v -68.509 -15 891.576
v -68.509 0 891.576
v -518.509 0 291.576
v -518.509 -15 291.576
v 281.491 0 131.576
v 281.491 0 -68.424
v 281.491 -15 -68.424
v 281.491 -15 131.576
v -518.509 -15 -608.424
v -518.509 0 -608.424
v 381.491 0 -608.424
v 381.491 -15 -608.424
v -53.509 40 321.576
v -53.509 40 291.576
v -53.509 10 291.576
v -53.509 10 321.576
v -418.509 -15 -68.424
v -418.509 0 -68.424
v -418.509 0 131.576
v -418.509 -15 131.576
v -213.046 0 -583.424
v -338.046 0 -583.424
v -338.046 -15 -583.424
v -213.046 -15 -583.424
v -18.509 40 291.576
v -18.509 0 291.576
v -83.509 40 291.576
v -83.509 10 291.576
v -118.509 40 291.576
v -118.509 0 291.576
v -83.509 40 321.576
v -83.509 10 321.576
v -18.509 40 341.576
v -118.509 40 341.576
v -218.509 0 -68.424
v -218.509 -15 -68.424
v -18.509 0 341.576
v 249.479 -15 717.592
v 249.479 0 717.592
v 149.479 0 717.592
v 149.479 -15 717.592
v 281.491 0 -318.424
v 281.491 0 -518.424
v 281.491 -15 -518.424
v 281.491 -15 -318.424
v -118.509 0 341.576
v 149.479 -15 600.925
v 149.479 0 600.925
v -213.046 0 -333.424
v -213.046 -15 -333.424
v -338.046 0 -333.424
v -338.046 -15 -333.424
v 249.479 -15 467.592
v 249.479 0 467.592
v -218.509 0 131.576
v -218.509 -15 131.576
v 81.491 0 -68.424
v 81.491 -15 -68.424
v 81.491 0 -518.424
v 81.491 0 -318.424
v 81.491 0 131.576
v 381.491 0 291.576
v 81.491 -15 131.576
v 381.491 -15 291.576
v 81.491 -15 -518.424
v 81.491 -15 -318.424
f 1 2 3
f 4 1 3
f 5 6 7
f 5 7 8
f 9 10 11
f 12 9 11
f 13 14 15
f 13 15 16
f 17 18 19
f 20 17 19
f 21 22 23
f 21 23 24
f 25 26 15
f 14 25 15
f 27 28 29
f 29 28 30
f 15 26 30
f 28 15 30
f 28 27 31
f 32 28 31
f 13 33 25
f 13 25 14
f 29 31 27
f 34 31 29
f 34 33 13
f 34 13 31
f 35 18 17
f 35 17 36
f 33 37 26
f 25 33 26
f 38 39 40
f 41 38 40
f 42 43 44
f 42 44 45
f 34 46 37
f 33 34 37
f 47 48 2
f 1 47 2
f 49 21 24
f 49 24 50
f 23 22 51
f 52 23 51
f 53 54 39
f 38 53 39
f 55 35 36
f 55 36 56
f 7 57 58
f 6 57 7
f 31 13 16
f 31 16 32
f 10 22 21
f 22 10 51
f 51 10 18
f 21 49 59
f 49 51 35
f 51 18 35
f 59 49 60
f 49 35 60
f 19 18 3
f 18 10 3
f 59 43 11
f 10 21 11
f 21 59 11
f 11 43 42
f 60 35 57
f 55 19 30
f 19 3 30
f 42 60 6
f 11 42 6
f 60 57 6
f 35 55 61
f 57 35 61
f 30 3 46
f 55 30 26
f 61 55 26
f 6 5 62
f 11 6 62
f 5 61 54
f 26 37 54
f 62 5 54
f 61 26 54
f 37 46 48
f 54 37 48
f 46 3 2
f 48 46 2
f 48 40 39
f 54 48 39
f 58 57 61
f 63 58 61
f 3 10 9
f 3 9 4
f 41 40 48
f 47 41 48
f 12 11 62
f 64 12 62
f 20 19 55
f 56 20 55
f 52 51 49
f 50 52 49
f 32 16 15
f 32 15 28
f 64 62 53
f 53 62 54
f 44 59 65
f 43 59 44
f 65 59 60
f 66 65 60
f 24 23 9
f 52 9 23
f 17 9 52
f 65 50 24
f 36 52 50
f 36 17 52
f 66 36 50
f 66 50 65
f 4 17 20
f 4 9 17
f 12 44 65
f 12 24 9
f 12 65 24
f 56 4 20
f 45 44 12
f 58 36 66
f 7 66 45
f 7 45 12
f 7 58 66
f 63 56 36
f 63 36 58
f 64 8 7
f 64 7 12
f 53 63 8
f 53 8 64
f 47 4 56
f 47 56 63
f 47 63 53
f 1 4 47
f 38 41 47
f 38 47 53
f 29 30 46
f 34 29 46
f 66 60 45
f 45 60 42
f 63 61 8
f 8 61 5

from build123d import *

# Parameters (mm, degrees)
F0_W     = 900
F0_H     = 900
F0_W_2   = 125
F0_H_2   = 250
F0_W_3   = 200
F0_H_3   = 200
F1_DEPTH = 15
F3_DEPTH = 40
F4_W     = 30
F4_H     = 30
F5_DEPTH = 30


with BuildPart() as f1:
    # F0 (on Front) → F1 (new body)
    with BuildSketch(Plane.XZ):
        with Locations((-68.50922, -158.423999)):
            Rectangle(F0_W, F0_H)
        with Locations((-275.546044, -458.423999)):
            Rectangle(F0_W_2, F0_H_2, mode=Mode.SUBTRACT)
        with Locations((-318.50922, 31.576001)):
            Rectangle(F0_W_3, F0_H_3, mode=Mode.SUBTRACT)
        with Locations((181.49078, -418.423999)):
            Rectangle(F0_W_3, F0_H_3, mode=Mode.SUBTRACT)
        with Locations((181.49078, 31.576001)):
            Rectangle(F0_W_3, F0_H_3, mode=Mode.SUBTRACT)
        Polygon((-518.50922, 291.576001), (381.49078, 291.576001), (249.479083, 467.591597), (149.479083, 600.92493), (-68.50922, 891.576001), align=None)
        Polygon((149.479083, 600.92493), (249.479083, 467.591597), (249.479083, 717.591597), (149.479083, 717.591597), align=None)
    extrude(amount=F1_DEPTH)

    # F2 (on face) → F3 (join)
    with BuildSketch(Plane(origin=(0, 0, 0), x_dir=(-1, 0, 0), z_dir=(0, 1, 0))):
        Polygon((18.50922, 291.576001), (68.50922, 291.576001), (118.50922, 291.576001), (118.50922, 341.576001), (18.50922, 341.576001), align=None)
    extrude(amount=F3_DEPTH)

    # F4 (on face) → F5 (cut)
    with BuildSketch(Plane(origin=(0, 40, 0), x_dir=(-1, 0, 0), z_dir=(0, 1, 0))):
        with Locations((68.50922, 306.576001)):
            Rectangle(F4_W, F4_H)
    extrude(amount=-F5_DEPTH, mode=Mode.SUBTRACT)


solid = f1.part
